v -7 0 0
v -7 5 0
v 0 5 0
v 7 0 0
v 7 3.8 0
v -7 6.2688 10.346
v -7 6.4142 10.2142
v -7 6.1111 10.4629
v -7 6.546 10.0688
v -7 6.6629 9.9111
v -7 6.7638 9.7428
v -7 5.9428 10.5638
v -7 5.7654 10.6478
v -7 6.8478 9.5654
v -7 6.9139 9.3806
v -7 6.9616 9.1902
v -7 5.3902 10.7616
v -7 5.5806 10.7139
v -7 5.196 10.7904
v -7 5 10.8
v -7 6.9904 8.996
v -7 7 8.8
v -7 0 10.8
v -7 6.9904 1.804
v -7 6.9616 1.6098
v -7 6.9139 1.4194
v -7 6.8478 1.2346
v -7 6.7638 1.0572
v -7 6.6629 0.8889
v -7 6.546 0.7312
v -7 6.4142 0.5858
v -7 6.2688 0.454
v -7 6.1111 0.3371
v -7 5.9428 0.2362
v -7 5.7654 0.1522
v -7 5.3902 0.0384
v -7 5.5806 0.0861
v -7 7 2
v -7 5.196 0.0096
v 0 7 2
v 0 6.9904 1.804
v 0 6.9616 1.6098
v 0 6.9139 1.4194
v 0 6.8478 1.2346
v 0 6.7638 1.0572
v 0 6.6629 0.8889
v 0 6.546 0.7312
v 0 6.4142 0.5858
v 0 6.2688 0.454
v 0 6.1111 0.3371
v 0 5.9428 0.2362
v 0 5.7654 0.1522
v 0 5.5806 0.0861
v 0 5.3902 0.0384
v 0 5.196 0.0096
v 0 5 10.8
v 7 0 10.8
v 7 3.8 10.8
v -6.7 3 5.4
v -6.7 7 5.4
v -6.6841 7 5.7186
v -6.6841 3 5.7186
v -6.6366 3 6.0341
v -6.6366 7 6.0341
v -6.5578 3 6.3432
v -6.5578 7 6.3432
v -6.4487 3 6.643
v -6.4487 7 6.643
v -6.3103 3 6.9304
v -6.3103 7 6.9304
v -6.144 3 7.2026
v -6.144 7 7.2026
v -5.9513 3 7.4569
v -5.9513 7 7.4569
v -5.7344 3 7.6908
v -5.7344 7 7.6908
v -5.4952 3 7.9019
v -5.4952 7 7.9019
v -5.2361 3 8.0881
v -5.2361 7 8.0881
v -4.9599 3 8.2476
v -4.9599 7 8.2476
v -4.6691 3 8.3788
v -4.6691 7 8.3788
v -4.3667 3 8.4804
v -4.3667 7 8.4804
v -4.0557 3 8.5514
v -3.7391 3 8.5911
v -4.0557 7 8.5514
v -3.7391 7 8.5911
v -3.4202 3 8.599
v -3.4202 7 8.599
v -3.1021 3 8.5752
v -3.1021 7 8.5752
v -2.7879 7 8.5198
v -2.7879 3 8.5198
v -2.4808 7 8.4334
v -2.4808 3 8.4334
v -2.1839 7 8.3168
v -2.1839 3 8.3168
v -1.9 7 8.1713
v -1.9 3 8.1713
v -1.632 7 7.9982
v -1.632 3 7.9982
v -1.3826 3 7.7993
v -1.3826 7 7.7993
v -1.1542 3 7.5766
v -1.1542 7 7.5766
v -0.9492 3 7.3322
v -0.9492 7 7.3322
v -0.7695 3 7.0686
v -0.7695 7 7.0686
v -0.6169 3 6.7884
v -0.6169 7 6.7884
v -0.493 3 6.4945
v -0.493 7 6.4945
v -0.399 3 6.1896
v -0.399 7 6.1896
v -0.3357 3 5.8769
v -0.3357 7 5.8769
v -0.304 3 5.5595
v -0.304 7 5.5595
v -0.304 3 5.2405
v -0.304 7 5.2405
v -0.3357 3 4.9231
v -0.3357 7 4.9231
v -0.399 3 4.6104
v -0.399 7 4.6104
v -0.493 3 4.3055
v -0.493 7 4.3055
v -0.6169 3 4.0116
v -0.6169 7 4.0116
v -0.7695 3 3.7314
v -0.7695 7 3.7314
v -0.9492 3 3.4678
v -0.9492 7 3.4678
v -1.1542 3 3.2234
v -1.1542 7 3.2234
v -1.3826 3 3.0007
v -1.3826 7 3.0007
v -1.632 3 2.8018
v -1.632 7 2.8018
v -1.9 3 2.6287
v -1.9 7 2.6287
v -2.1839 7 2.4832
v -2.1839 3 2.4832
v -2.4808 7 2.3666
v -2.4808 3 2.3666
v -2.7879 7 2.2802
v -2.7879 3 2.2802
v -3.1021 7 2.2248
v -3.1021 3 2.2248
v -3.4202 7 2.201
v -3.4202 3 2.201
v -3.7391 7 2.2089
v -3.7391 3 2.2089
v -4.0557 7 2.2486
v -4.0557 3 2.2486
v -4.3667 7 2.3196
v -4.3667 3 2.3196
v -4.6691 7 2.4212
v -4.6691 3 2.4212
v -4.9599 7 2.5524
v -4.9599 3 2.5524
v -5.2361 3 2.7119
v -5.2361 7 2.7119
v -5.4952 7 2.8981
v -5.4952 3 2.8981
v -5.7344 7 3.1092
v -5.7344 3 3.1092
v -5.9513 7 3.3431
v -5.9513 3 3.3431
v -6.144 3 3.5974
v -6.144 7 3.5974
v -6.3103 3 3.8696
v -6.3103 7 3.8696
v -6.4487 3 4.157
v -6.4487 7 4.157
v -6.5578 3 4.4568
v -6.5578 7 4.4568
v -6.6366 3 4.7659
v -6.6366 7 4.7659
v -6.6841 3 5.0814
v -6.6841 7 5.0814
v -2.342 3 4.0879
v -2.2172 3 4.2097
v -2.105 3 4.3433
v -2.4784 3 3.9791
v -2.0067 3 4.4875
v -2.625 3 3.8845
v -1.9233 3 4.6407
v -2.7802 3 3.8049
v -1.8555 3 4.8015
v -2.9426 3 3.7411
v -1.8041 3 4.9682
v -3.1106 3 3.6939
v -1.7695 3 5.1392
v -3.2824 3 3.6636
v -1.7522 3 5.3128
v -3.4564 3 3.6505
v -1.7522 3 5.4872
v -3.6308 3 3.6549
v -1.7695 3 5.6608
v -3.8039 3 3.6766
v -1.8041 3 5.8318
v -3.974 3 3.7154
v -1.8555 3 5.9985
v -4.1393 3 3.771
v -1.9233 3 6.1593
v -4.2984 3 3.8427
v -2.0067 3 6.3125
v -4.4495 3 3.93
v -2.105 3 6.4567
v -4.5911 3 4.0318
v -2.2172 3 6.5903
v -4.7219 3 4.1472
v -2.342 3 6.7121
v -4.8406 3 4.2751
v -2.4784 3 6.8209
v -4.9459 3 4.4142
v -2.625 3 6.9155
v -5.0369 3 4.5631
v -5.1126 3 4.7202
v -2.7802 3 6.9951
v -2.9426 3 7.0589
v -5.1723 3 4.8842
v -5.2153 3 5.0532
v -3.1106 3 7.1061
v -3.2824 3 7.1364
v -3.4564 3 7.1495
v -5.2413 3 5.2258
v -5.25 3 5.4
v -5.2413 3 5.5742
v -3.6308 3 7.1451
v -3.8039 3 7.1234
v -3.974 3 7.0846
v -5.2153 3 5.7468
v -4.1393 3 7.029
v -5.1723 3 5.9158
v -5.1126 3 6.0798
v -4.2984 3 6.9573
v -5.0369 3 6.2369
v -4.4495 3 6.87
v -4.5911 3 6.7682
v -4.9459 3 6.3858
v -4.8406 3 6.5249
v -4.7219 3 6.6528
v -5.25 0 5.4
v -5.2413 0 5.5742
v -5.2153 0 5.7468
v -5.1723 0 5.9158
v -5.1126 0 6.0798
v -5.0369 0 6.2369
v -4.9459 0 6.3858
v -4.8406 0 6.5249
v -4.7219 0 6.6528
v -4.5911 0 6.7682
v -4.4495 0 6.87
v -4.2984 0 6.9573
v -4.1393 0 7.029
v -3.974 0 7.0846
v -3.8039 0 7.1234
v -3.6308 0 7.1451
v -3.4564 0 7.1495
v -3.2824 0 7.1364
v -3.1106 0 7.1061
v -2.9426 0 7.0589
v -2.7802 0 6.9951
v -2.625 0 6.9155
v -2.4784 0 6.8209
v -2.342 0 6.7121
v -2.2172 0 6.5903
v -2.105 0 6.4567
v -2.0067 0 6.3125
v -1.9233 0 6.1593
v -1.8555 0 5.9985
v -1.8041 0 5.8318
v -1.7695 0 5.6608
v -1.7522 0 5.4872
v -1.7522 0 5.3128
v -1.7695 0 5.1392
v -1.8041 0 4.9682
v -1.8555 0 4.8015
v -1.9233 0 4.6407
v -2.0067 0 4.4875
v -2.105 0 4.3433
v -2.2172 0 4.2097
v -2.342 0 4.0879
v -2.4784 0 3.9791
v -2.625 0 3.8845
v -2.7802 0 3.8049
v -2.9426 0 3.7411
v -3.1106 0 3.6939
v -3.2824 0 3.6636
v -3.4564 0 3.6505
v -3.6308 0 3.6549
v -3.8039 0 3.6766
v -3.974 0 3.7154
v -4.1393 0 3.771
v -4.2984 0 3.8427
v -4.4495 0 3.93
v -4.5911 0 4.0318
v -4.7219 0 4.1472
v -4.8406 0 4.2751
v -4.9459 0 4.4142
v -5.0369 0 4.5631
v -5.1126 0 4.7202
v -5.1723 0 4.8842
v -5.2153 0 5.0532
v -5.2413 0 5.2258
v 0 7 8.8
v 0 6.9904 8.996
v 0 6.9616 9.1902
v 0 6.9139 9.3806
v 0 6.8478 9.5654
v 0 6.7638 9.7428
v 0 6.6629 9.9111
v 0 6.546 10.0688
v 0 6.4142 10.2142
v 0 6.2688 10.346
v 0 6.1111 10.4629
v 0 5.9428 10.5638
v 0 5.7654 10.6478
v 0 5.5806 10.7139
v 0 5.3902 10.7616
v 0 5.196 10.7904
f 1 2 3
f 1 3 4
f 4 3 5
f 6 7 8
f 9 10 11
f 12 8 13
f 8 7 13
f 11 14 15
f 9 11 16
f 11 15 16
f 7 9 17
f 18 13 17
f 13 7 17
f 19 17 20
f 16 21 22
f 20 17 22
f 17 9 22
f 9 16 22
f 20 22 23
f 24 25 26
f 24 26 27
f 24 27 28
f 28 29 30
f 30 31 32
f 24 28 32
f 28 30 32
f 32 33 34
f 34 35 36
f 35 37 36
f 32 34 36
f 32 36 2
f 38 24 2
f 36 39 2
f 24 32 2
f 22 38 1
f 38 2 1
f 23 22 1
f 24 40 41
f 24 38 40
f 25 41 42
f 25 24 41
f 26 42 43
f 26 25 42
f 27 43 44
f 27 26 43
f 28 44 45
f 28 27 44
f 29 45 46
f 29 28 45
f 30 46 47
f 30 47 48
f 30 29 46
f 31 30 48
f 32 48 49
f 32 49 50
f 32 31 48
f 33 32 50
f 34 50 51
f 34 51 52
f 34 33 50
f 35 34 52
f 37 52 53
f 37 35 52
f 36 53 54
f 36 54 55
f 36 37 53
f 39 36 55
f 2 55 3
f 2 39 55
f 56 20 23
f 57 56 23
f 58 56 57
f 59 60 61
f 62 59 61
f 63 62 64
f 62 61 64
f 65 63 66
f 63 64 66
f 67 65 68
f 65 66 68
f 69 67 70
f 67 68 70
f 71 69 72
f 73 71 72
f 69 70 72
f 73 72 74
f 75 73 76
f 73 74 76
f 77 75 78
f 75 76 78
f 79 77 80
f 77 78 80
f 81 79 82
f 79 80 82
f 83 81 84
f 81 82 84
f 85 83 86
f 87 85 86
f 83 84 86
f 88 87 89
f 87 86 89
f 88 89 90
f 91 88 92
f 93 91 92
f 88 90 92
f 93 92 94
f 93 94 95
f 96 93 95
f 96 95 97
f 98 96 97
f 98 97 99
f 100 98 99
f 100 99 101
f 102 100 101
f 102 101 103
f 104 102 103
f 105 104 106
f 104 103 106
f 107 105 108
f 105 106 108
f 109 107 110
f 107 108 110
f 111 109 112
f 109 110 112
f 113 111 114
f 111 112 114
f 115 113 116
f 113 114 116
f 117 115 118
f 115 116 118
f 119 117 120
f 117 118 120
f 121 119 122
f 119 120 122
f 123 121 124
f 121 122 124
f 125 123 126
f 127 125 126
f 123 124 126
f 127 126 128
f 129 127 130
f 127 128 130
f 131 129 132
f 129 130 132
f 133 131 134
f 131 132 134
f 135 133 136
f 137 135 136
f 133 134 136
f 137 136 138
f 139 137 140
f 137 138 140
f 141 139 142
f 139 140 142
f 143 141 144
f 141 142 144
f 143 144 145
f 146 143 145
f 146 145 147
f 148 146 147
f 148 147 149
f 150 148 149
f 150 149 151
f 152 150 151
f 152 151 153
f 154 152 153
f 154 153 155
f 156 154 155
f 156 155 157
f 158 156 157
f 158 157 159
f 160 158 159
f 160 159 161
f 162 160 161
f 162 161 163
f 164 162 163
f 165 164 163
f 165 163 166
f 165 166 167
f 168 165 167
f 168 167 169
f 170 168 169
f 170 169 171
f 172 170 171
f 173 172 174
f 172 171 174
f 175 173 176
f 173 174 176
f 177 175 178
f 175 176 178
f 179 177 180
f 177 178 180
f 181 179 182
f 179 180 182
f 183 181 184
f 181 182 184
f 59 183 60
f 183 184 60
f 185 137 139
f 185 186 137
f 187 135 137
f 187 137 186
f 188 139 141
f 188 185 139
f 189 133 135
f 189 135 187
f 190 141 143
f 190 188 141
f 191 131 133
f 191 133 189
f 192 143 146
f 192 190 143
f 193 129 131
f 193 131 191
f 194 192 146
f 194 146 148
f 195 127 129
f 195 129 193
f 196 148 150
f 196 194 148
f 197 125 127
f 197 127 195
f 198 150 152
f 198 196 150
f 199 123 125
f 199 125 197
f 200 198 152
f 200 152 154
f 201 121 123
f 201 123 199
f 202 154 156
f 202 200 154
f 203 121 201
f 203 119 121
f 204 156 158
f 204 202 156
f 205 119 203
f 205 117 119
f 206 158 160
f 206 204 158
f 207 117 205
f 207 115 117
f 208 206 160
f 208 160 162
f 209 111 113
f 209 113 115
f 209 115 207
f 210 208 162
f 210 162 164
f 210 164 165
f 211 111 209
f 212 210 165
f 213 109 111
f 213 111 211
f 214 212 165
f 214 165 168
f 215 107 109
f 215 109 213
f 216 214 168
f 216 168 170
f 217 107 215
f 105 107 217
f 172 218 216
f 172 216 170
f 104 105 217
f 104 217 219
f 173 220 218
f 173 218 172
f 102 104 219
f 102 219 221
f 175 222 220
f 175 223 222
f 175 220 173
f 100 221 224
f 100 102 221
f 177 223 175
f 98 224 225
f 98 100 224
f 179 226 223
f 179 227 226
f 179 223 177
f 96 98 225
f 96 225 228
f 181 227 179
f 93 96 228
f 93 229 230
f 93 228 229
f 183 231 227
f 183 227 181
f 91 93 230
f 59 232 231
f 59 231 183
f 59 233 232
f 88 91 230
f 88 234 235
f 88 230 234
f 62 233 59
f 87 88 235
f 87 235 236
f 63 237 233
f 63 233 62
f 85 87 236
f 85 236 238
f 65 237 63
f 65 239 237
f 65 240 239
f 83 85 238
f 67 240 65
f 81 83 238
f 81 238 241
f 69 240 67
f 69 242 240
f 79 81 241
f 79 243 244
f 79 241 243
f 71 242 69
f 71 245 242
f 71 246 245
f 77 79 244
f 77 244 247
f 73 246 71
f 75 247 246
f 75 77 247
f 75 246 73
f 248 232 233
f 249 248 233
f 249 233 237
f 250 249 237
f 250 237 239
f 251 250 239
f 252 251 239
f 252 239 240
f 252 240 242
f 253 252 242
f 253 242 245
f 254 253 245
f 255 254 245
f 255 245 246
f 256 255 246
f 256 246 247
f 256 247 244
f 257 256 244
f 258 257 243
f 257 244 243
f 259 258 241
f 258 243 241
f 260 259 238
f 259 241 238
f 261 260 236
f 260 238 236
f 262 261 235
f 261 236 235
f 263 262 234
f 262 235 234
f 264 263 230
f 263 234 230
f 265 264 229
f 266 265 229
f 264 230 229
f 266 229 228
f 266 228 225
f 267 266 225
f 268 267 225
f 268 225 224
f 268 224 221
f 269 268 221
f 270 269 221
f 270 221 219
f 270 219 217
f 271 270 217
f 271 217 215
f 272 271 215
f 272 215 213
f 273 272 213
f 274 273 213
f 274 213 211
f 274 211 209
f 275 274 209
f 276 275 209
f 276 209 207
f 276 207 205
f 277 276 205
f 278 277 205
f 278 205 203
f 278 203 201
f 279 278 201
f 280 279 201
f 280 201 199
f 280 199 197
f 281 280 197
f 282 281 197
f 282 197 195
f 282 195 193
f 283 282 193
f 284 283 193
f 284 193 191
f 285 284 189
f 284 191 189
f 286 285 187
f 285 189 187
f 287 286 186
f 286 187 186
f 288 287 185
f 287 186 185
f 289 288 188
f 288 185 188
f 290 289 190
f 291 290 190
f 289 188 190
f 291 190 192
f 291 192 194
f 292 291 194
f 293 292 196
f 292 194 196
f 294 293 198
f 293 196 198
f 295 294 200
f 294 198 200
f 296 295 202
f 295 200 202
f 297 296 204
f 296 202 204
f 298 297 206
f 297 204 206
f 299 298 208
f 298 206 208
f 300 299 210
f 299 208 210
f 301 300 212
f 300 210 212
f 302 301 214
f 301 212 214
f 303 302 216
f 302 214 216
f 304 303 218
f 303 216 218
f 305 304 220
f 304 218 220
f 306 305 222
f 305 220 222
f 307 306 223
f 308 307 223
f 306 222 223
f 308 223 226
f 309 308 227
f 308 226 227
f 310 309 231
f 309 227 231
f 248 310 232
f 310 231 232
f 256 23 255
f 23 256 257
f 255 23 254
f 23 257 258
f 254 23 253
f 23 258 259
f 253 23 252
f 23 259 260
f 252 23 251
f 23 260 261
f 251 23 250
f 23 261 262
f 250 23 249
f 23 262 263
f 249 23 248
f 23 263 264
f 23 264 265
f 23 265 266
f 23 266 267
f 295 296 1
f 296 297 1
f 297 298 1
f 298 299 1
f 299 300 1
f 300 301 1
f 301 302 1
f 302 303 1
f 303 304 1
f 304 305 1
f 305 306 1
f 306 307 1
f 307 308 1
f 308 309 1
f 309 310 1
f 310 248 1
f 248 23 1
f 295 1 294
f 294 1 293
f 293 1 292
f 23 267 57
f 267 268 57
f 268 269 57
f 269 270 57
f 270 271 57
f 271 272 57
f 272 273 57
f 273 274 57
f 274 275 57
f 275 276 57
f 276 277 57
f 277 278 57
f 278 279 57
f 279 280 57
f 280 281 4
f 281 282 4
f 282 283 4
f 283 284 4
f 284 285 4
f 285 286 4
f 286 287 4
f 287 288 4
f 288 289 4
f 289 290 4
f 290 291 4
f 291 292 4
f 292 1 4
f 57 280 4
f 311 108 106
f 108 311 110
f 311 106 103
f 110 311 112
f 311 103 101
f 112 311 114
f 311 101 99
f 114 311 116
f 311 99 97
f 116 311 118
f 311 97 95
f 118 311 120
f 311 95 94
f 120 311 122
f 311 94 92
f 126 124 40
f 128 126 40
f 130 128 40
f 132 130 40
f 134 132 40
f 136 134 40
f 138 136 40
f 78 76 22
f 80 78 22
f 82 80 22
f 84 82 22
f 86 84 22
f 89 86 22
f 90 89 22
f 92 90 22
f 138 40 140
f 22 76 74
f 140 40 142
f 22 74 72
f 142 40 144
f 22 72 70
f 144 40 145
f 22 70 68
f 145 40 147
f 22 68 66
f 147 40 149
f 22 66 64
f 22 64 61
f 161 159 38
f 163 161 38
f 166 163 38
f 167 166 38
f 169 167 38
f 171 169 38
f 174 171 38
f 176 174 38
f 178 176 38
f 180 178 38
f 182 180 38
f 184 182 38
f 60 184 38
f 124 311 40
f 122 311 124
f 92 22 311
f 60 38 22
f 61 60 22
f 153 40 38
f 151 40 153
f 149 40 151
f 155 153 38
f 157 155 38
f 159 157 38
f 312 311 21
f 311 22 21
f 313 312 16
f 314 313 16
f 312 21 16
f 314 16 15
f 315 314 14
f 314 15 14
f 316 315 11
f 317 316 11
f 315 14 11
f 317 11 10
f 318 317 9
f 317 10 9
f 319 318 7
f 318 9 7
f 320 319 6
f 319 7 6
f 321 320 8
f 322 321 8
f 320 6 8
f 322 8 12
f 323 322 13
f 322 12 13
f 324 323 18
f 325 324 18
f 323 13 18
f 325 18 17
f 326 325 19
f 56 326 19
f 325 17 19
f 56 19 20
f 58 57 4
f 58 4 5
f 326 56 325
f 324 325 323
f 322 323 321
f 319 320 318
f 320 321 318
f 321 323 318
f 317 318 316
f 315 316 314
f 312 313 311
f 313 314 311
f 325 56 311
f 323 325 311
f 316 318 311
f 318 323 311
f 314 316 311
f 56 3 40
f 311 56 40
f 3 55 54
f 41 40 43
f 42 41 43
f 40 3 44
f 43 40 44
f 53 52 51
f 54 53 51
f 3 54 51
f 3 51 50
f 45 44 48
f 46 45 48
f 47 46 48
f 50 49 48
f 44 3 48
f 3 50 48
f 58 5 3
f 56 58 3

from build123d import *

# Parameters (mm, degrees)
F1_DEPTH = 10.8
F2_R     = 1.75
F3_DEPTH = 7.001
F4_R     = 3.2
F5_DEPTH = 4
F6_R     = 2


with BuildPart() as f1:
    # F0 (on Top) → F1 (new body)
    with BuildSketch(Plane.XY):
        Polygon((-7, 7), (-7, 0), (7, 0), (7, 3.8), (0, 5), (0, 7), align=None)
    extrude(amount=F1_DEPTH)

    # F2 (on face) → F3 (cut, through all)
    with BuildSketch(Plane(origin=(0, 7, 0), x_dir=(-1, 0, 0), z_dir=(0, 1, 0))):
        with Locations((3.5, 5.4)):
            Circle(F2_R)
    extrude(amount=-F3_DEPTH, mode=Mode.SUBTRACT)

    # F4 (on face) → F5 (cut)
    with BuildSketch(Plane(origin=(0, 7, 0), x_dir=(-1, 0, 0), z_dir=(0, 1, 0))):
        with Locations((3.5, 5.4)):
            Circle(F4_R)
    extrude(amount=-F5_DEPTH, mode=Mode.SUBTRACT)

    # F6
    f6_edges = [f1.edges().sort_by_distance(p)[0] for p in [
        (-3.5, 7, 10.8),
        (-3.5, 7, 0),
    ]]
    fillet(f6_edges, radius=F6_R)


solid = f1.part
